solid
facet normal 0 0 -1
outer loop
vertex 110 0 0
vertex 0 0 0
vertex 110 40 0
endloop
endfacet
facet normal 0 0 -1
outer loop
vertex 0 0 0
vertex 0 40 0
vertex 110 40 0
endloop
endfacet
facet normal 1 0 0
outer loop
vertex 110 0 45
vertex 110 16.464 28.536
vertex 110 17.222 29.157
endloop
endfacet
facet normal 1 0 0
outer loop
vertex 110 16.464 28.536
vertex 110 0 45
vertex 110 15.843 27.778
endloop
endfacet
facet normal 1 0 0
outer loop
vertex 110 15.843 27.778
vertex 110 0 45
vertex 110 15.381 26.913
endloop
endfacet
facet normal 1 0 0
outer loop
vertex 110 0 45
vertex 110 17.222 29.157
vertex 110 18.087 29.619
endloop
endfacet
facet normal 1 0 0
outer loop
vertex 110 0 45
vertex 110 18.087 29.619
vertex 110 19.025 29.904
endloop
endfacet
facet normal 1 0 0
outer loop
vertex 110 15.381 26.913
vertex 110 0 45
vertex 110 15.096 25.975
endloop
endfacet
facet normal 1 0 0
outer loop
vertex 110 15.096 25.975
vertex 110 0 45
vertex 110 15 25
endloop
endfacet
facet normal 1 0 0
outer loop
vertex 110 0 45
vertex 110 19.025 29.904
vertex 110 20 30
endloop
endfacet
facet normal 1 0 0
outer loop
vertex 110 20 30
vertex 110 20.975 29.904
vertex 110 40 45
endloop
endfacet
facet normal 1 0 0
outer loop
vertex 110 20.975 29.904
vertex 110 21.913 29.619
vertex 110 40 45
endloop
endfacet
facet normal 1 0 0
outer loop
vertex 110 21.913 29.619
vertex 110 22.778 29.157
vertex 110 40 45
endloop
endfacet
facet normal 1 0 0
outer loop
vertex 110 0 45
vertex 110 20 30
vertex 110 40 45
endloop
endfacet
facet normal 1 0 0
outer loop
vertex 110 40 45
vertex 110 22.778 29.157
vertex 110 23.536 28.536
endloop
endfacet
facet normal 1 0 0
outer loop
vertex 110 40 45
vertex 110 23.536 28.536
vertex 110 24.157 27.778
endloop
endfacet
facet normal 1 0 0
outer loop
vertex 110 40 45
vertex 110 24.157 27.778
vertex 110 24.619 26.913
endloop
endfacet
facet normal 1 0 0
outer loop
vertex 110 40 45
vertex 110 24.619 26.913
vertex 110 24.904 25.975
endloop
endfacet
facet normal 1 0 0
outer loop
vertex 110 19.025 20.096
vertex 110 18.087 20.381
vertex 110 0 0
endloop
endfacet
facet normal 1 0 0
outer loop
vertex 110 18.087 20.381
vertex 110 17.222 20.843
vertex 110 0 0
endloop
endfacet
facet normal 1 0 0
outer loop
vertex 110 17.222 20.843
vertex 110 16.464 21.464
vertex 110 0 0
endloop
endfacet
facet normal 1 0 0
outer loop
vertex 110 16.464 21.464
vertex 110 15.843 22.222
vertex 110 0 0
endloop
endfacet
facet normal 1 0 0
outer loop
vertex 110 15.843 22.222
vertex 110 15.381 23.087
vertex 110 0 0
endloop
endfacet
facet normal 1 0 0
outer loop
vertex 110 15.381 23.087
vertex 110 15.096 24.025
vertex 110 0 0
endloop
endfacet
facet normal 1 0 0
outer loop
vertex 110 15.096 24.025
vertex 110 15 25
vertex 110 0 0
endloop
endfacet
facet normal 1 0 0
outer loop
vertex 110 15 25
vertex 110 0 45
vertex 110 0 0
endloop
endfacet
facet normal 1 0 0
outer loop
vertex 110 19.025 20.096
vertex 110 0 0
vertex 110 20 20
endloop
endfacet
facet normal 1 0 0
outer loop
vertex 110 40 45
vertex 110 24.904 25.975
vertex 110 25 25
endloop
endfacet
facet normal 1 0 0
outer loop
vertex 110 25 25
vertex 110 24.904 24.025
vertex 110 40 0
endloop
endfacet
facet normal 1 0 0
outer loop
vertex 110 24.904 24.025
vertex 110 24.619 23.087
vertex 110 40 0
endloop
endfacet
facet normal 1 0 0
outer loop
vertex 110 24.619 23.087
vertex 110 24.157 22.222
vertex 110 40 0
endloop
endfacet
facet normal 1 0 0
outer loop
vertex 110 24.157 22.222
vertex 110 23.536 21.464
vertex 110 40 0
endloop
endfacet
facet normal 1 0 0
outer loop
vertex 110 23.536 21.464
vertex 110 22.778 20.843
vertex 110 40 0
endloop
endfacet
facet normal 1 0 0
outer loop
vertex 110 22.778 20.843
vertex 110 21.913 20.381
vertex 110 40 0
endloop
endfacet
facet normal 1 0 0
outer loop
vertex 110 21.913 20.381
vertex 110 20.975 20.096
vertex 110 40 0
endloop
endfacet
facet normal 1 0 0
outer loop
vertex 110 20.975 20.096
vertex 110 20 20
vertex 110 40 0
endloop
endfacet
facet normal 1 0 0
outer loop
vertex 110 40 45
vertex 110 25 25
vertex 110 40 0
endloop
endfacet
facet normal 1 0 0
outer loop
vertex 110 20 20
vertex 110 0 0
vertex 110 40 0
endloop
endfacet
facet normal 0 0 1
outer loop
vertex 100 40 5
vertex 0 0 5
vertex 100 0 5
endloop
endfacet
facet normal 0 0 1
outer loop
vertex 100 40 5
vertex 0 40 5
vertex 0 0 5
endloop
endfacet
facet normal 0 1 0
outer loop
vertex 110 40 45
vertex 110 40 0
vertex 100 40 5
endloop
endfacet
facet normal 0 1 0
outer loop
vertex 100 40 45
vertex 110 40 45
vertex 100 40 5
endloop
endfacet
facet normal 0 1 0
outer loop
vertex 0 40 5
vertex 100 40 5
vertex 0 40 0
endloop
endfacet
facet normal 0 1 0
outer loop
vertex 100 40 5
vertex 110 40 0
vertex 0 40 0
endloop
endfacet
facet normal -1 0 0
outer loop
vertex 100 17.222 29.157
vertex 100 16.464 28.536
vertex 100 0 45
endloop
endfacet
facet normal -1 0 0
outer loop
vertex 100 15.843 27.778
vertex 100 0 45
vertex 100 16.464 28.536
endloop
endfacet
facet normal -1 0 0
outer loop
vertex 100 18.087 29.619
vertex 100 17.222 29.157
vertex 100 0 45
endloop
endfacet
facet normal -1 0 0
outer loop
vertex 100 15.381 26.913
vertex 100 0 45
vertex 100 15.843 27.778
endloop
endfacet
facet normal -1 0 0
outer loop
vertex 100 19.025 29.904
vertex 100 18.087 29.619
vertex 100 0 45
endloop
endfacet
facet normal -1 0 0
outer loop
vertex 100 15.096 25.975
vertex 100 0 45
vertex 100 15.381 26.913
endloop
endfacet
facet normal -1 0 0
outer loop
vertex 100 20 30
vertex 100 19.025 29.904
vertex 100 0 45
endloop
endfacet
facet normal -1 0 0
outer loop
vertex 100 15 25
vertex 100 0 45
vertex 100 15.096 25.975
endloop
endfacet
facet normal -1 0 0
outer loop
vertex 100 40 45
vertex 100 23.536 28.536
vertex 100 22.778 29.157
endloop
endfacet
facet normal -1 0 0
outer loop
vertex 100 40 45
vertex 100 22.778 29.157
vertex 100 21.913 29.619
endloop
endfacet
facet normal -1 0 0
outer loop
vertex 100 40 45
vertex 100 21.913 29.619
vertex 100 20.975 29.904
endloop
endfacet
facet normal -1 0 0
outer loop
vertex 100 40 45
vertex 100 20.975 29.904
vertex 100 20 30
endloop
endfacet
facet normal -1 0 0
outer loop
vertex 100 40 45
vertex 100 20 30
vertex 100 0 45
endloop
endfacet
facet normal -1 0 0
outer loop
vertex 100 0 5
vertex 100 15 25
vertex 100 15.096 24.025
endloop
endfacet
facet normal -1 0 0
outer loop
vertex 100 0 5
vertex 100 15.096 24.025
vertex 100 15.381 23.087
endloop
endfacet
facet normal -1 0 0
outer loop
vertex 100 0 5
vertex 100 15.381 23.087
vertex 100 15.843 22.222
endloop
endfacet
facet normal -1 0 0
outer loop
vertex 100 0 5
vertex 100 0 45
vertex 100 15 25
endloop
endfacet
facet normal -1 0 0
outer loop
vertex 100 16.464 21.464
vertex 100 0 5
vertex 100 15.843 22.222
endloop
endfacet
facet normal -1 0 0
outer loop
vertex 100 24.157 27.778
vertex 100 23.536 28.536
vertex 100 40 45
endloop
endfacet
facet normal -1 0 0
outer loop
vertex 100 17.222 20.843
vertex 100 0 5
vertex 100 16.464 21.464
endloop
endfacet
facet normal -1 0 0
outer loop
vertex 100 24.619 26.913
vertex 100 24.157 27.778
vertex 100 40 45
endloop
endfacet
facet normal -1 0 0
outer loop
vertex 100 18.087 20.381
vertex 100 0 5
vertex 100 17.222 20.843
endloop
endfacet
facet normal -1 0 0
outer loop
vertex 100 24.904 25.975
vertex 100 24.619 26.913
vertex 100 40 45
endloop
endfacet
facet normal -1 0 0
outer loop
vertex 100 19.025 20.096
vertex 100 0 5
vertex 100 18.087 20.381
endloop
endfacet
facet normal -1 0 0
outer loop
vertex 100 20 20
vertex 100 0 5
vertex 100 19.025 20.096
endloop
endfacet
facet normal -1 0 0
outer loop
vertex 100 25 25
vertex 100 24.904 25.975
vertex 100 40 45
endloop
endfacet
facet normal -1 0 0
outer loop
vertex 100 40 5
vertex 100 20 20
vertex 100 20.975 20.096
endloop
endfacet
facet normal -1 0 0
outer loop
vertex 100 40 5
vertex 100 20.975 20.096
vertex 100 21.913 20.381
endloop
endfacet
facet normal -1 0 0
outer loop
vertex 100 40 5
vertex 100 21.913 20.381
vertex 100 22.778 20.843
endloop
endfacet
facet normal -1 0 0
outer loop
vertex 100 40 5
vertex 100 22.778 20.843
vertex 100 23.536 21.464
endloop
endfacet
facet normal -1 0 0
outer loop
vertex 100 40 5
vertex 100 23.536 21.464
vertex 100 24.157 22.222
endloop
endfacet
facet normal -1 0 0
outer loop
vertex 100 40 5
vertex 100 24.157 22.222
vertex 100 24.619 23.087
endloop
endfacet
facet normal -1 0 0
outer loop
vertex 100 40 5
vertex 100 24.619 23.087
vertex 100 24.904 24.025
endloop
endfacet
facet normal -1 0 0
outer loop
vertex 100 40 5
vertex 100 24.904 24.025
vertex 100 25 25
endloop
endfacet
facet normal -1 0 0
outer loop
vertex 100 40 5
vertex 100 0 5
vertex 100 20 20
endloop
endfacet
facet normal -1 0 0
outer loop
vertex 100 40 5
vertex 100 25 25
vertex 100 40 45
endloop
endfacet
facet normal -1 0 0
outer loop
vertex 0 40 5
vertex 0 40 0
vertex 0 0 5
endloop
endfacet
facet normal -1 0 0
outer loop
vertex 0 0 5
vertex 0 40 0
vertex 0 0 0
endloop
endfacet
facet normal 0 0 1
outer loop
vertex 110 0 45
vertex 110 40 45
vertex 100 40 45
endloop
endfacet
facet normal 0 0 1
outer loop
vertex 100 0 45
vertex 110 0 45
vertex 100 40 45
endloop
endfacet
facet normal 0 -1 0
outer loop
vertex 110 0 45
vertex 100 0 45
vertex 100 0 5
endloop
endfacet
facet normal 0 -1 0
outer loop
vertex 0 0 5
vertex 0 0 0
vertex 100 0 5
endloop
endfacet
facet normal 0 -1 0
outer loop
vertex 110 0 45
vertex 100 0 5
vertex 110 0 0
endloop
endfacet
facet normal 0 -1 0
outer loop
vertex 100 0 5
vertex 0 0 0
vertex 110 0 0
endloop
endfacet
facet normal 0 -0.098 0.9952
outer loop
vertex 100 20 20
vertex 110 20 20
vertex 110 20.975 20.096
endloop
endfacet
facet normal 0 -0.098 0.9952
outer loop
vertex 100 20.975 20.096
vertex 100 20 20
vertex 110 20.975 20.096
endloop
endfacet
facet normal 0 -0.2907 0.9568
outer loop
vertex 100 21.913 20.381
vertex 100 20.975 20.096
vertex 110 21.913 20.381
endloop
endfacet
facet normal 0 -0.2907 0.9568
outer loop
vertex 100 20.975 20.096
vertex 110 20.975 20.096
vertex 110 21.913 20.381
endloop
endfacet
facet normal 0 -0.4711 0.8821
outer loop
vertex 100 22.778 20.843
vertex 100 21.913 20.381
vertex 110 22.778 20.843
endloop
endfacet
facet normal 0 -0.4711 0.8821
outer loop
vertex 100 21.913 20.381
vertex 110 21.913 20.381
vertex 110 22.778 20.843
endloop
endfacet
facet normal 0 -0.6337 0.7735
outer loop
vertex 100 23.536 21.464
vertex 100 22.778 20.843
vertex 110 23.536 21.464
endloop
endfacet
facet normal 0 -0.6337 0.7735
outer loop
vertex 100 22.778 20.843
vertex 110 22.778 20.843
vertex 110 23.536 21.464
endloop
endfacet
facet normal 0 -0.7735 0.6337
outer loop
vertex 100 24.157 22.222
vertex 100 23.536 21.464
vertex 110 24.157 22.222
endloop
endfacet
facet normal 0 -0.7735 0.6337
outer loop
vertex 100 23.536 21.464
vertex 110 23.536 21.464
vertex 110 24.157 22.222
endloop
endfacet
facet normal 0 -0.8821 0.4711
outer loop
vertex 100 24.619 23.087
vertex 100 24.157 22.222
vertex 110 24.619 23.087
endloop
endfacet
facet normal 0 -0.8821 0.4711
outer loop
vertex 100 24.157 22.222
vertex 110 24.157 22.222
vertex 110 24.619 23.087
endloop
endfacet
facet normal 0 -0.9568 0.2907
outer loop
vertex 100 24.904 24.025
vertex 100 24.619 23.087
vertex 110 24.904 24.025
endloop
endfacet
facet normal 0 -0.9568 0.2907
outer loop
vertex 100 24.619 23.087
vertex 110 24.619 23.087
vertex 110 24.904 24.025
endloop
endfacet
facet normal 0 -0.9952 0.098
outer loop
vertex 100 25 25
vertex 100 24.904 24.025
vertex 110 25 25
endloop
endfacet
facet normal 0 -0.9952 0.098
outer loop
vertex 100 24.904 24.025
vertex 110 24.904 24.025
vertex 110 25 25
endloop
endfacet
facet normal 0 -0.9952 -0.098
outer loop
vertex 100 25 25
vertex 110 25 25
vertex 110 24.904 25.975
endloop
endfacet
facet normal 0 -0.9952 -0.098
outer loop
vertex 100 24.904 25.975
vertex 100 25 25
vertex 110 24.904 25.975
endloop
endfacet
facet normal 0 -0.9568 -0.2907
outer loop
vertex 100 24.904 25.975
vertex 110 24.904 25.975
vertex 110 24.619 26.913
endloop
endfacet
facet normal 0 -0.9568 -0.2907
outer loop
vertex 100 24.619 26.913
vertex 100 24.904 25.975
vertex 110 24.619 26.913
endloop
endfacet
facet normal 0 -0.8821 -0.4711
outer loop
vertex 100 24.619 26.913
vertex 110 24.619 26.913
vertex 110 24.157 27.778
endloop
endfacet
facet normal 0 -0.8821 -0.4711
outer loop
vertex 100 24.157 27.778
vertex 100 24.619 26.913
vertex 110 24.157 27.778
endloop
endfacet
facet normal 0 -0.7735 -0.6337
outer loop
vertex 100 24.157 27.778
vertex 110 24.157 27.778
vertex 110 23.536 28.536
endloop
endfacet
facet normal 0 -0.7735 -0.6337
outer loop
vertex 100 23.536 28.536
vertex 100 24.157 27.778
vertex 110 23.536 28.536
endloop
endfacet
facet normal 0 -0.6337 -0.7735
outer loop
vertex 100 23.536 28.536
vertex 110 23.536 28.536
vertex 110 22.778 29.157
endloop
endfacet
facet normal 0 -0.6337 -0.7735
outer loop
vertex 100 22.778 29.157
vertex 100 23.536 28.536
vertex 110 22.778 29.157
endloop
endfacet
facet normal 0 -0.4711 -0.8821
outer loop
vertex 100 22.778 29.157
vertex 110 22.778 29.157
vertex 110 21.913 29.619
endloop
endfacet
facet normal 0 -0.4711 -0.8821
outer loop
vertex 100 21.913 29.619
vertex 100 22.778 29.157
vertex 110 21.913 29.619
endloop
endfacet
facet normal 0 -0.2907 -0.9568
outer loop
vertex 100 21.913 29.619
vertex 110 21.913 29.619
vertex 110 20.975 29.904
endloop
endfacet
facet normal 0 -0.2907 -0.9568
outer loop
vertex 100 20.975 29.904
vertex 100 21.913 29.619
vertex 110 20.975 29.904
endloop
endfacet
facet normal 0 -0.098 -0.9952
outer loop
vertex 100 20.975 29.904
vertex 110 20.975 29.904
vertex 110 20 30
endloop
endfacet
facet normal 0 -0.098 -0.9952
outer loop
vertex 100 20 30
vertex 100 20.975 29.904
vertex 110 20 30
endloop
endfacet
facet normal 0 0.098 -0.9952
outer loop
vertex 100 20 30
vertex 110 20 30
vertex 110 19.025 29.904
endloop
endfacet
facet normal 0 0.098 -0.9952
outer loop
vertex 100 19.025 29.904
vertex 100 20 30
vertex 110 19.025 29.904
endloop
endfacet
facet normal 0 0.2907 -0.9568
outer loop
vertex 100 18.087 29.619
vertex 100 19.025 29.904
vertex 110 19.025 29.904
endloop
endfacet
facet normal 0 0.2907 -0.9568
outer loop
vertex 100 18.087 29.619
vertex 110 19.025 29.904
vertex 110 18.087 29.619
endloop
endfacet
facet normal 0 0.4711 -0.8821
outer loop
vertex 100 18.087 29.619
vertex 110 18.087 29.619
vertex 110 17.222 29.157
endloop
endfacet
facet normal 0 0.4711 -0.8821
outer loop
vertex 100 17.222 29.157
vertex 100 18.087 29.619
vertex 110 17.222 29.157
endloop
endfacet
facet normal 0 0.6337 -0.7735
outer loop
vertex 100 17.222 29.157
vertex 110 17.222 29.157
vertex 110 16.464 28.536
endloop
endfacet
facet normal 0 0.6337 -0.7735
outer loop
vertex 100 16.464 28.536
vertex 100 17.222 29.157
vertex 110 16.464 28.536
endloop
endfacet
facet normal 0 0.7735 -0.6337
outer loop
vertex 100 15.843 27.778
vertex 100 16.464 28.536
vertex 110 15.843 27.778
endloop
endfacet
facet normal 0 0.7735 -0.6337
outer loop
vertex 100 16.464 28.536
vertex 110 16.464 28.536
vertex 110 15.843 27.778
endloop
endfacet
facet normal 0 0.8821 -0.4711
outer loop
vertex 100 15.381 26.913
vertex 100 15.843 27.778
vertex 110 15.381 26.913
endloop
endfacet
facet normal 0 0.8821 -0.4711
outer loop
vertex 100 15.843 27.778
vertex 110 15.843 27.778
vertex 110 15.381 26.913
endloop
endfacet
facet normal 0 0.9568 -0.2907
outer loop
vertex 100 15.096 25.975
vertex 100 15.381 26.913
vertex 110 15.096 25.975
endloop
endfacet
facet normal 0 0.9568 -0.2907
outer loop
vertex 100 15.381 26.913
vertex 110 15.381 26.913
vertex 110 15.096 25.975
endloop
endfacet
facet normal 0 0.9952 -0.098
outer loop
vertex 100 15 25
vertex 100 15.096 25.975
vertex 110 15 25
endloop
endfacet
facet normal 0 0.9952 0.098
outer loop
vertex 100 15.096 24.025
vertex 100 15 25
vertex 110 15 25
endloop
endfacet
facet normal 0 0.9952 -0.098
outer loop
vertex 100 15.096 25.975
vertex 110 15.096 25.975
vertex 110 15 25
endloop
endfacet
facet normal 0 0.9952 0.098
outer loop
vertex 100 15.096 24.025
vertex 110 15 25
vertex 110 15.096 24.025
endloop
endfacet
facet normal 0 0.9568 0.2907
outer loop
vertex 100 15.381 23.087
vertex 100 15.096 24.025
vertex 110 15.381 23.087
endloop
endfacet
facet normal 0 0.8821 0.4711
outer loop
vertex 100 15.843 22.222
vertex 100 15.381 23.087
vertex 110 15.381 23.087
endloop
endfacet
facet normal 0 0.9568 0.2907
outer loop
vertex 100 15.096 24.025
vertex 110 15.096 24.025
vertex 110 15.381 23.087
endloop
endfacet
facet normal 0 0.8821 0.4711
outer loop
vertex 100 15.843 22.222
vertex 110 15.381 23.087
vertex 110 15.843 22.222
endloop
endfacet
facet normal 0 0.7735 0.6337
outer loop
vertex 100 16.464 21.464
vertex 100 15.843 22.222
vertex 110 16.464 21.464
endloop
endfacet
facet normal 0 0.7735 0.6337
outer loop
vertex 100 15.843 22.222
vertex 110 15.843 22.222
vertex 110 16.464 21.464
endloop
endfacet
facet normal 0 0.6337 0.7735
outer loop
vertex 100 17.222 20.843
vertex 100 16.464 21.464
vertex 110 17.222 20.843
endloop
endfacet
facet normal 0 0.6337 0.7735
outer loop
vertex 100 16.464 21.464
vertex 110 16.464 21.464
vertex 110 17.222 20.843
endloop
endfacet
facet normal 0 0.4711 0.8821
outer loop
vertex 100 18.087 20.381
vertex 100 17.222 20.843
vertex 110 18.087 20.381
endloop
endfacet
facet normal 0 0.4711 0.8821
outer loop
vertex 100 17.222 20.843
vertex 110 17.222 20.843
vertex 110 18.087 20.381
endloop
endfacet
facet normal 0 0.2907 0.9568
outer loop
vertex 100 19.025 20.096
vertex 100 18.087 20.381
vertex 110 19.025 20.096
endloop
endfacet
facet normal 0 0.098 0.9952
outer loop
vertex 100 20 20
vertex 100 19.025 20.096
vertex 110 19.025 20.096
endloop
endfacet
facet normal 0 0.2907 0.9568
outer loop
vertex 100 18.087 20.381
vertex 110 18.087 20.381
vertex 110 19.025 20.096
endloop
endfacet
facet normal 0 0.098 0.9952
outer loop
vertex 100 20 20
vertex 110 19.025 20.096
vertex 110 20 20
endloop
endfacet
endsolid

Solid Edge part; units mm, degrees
sketch "Sketch1" plane through (0, 0, 0) normal (0, 0, 1) x (1, 0, 0)
  line L0 (110, 40) -> (0, 40)
  line L1 (0, 40) -> (0, 0)
  line L2 (0, 0) -> (110, 0)
  line L3 (110, 0) -> (110, 40)
extrude "Protrusion1" add sketch "Sketch1" along normal blind 5
sketch "Sketch2" plane through (60, 20, 5) normal (0, 0, 1) x (1, 0, 0)
  line L0 (40, -20) -> (40, 20)
  line L1 (40, 20) -> (50, 20)
  line L2 (50, 20) -> (50, -20)
  line L3 (50, -20) -> (40, -20)
extrude "Extrusionsausprägung_2" add sketch "Sketch2" along normal blind 40
hole "Bohrung_1" at (110, 20, 25) direction (-1, 0, 0) diameter 10 end up to next
